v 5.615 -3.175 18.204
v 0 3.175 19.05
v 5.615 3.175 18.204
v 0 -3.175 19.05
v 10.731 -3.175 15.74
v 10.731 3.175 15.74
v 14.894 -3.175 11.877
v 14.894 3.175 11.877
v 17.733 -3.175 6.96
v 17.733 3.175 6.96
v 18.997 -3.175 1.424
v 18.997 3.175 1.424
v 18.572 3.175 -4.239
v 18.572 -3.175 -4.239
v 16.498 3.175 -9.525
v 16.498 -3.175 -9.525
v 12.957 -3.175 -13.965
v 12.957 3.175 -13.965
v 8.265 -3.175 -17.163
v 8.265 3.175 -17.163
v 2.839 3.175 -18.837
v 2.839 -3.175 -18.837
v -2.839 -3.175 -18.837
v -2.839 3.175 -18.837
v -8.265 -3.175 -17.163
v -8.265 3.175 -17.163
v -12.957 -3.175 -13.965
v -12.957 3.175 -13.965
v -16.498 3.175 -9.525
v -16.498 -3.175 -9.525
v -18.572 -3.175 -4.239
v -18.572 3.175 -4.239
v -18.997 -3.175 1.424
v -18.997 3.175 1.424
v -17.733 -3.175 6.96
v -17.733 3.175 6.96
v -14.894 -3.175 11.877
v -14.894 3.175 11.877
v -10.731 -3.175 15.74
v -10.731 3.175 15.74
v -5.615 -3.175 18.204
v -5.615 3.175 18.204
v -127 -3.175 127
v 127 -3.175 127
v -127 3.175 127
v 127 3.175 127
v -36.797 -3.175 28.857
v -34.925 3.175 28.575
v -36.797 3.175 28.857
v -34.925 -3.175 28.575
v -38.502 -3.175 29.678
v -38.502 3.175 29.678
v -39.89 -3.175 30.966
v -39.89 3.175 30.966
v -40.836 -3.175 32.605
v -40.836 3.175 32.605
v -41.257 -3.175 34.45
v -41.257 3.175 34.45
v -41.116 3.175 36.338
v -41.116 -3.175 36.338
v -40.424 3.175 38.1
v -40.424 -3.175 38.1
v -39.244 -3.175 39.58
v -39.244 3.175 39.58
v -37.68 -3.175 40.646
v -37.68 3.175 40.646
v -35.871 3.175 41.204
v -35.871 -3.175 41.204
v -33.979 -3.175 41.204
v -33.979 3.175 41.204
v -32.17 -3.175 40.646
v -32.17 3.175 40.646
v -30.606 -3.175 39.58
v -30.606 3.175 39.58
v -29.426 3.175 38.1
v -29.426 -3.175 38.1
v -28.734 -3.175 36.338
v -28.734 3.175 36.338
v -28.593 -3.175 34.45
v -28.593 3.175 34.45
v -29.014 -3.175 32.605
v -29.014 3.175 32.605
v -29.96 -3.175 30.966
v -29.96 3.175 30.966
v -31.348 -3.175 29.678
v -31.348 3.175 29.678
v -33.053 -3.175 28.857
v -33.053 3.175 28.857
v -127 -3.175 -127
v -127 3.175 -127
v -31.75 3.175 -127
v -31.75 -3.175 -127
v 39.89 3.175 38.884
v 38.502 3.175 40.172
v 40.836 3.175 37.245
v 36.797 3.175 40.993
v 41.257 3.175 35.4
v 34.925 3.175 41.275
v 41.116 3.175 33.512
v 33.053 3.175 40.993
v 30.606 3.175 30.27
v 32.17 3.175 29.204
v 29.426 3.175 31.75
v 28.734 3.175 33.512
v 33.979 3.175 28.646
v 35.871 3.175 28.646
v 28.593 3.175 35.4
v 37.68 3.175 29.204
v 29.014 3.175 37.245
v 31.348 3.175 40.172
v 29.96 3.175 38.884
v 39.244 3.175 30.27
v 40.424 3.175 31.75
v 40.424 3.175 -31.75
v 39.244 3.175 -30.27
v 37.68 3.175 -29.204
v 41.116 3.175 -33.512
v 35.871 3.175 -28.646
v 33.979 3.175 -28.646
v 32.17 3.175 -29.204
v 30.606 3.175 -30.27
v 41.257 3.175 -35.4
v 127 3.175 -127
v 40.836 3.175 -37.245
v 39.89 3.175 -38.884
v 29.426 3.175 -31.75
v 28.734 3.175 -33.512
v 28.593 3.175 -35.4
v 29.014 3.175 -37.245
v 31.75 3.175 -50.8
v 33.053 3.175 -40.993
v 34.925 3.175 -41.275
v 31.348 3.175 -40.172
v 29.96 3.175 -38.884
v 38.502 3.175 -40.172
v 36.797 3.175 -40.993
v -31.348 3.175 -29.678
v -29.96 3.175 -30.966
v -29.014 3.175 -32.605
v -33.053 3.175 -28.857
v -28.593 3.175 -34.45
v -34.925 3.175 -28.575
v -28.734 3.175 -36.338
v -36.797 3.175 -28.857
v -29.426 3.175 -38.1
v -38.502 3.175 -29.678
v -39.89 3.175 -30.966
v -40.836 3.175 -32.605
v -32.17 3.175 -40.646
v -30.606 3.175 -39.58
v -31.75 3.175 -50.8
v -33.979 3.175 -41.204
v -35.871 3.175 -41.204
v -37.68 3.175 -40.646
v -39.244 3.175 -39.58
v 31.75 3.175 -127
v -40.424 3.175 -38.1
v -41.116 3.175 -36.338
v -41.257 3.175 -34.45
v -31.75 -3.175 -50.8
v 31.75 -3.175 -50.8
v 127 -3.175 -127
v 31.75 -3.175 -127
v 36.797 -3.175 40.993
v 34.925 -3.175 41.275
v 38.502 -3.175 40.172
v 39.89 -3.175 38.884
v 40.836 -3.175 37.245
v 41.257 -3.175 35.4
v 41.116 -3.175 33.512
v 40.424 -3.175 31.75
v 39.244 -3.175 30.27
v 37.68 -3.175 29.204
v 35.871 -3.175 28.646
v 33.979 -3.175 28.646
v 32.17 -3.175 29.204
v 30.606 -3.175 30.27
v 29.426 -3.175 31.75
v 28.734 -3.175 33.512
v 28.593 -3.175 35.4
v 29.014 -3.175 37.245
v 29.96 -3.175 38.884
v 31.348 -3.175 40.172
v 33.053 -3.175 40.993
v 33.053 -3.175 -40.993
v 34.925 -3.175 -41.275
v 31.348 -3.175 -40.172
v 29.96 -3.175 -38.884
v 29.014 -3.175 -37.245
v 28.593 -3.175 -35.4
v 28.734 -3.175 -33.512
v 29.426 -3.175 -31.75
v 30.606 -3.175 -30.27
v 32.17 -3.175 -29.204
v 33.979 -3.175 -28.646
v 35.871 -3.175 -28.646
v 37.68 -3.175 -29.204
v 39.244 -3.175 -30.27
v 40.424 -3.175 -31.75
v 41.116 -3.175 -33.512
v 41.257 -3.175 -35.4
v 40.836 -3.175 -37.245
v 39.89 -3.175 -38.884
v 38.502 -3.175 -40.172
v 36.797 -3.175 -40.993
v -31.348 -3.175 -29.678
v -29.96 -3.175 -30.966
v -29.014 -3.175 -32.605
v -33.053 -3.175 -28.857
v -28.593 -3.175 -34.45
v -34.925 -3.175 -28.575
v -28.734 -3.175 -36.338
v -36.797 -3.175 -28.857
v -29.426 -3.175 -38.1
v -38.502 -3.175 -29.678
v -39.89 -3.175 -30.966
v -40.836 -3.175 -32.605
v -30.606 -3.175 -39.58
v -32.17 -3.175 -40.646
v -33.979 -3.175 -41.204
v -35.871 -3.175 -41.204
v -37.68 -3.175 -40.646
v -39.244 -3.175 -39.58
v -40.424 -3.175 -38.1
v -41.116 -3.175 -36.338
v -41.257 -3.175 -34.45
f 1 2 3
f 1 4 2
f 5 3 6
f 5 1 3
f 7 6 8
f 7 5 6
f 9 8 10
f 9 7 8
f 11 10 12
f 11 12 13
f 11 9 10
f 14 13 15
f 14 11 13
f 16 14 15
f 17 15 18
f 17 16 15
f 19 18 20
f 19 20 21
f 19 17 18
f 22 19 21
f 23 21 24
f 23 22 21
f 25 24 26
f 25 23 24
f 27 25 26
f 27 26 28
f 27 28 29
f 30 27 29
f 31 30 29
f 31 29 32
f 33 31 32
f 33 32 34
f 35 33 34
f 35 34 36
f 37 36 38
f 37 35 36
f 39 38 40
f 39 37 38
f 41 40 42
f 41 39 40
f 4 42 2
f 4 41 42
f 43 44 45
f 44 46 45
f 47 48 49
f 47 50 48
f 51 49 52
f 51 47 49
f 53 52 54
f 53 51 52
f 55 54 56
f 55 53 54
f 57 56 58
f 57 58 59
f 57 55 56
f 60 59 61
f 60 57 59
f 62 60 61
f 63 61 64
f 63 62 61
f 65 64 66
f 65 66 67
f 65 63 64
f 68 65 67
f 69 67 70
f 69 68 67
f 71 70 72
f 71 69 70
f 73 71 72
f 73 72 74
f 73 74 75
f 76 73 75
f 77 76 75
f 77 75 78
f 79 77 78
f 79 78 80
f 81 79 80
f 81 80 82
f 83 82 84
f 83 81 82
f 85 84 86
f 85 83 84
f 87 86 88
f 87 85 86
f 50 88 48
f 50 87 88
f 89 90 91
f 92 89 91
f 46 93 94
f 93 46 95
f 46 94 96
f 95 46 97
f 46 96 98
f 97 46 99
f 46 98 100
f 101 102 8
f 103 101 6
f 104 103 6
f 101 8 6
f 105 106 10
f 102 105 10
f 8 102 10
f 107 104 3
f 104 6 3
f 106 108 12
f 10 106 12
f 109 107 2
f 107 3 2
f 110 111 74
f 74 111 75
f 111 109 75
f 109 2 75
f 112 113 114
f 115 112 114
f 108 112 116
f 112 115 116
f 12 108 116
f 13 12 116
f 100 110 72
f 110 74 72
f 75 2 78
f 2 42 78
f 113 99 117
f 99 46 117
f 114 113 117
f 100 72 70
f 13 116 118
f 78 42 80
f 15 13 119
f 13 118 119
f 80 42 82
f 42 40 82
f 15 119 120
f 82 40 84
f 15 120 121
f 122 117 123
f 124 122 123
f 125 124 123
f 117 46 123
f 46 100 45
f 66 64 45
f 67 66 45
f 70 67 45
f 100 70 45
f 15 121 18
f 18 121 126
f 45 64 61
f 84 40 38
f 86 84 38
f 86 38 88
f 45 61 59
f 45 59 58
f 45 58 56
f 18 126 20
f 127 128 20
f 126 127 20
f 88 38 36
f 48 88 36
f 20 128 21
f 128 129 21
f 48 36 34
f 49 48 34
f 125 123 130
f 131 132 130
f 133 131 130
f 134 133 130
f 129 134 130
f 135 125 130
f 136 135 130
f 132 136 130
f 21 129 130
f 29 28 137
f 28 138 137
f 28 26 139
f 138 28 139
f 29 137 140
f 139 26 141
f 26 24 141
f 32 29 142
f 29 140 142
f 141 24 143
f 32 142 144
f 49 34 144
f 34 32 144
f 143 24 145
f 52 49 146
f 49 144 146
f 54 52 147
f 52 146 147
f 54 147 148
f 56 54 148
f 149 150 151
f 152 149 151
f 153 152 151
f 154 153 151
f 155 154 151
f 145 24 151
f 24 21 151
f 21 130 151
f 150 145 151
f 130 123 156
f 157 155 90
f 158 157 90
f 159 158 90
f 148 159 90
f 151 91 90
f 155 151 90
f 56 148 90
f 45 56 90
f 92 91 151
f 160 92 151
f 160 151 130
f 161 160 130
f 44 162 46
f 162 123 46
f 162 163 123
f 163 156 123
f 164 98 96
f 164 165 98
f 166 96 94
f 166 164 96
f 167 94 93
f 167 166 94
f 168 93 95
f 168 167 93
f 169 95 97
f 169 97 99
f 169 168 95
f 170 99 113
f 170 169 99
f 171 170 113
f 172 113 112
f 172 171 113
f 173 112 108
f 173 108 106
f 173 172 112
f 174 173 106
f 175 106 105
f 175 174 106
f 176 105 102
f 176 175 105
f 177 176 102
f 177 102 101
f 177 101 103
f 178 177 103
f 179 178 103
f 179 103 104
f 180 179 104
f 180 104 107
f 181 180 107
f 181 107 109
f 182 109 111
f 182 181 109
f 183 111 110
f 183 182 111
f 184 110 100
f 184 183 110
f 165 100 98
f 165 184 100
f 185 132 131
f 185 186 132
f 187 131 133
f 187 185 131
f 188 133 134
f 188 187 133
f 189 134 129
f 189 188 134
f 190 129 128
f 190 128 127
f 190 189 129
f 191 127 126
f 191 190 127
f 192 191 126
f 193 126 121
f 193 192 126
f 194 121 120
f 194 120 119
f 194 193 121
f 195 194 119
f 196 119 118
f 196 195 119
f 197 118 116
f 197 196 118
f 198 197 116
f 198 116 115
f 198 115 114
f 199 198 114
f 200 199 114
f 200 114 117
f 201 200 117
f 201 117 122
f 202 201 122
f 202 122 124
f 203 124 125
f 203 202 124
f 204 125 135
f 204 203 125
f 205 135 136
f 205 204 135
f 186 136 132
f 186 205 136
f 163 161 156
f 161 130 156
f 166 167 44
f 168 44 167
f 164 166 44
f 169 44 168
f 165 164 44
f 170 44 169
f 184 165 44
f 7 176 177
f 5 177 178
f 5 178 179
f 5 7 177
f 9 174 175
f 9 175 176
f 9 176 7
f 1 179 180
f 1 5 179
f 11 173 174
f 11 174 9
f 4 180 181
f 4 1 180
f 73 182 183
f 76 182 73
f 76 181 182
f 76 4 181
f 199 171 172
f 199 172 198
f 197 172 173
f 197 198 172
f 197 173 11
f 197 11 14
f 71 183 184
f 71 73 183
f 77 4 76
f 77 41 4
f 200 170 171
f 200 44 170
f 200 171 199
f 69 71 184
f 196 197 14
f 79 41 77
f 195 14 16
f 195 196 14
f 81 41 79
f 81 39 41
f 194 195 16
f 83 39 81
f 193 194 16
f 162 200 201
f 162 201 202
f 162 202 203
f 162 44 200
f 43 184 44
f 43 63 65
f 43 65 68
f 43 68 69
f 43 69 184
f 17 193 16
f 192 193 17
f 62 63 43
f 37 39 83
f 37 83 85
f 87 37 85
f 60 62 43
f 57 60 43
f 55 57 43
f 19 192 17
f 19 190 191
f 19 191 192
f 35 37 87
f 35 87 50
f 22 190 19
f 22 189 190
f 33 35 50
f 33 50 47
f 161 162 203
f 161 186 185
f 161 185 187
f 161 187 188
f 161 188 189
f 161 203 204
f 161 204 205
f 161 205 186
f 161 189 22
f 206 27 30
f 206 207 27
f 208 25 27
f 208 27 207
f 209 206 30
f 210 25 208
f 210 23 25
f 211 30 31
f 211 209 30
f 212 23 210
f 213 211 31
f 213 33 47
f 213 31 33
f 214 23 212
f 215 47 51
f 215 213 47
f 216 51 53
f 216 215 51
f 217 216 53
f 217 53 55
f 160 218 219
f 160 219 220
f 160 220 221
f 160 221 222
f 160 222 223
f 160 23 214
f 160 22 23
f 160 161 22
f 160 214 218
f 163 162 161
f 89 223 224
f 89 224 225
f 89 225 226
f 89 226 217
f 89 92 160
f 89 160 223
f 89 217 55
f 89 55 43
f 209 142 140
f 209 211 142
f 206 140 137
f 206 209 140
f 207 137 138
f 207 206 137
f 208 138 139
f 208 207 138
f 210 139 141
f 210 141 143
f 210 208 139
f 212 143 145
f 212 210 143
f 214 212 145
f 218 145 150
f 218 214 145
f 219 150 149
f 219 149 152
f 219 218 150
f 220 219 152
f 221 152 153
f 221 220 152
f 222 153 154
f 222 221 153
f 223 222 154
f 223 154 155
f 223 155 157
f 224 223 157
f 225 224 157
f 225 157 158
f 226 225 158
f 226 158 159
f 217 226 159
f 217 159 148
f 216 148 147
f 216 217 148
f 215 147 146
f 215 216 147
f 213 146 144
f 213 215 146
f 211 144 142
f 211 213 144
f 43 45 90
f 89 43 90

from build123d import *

# Parameters (mm, degrees)
SKETCH1_R           = 19.05
SKETCH1_R_2         = 6.35
BOSS_EXTRUDE1_DEPTH = 3.175


with BuildPart() as part:
    # Sketch1 → Boss-Extrude1 (new, symmetric)
    with BuildSketch(Plane(origin=(0, 0, 0), x_dir=(1, 0, 0), z_dir=(0, 1, 0))):
        Polygon((-31.75, 50.8), (31.75, 50.8), (31.75, 127), (127, 127), (127, -127), (-127, -127), (-127, 127), (-31.75, 127), align=None)
        with Locations(Location((0, 0, 0), (0, 0, 270))):
            Circle(SKETCH1_R, mode=Mode.SUBTRACT)
        with Locations(Location((-34.925, 34.925, 0), (0, 0, 270))):
            Circle(SKETCH1_R_2, mode=Mode.SUBTRACT)
        with Locations(Location((34.925, 34.925, 0), (0, 0, 90))):
            Circle(SKETCH1_R_2, mode=Mode.SUBTRACT)
        with Locations(Location((34.925, -34.925, 0), (0, 0, 270))):
            Circle(SKETCH1_R_2, mode=Mode.SUBTRACT)
        with Locations(Location((-34.925, -34.925, 0), (0, 0, 90))):
            Circle(SKETCH1_R_2, mode=Mode.SUBTRACT)
    extrude(amount=BOSS_EXTRUDE1_DEPTH, both=True)


solid = part.part
